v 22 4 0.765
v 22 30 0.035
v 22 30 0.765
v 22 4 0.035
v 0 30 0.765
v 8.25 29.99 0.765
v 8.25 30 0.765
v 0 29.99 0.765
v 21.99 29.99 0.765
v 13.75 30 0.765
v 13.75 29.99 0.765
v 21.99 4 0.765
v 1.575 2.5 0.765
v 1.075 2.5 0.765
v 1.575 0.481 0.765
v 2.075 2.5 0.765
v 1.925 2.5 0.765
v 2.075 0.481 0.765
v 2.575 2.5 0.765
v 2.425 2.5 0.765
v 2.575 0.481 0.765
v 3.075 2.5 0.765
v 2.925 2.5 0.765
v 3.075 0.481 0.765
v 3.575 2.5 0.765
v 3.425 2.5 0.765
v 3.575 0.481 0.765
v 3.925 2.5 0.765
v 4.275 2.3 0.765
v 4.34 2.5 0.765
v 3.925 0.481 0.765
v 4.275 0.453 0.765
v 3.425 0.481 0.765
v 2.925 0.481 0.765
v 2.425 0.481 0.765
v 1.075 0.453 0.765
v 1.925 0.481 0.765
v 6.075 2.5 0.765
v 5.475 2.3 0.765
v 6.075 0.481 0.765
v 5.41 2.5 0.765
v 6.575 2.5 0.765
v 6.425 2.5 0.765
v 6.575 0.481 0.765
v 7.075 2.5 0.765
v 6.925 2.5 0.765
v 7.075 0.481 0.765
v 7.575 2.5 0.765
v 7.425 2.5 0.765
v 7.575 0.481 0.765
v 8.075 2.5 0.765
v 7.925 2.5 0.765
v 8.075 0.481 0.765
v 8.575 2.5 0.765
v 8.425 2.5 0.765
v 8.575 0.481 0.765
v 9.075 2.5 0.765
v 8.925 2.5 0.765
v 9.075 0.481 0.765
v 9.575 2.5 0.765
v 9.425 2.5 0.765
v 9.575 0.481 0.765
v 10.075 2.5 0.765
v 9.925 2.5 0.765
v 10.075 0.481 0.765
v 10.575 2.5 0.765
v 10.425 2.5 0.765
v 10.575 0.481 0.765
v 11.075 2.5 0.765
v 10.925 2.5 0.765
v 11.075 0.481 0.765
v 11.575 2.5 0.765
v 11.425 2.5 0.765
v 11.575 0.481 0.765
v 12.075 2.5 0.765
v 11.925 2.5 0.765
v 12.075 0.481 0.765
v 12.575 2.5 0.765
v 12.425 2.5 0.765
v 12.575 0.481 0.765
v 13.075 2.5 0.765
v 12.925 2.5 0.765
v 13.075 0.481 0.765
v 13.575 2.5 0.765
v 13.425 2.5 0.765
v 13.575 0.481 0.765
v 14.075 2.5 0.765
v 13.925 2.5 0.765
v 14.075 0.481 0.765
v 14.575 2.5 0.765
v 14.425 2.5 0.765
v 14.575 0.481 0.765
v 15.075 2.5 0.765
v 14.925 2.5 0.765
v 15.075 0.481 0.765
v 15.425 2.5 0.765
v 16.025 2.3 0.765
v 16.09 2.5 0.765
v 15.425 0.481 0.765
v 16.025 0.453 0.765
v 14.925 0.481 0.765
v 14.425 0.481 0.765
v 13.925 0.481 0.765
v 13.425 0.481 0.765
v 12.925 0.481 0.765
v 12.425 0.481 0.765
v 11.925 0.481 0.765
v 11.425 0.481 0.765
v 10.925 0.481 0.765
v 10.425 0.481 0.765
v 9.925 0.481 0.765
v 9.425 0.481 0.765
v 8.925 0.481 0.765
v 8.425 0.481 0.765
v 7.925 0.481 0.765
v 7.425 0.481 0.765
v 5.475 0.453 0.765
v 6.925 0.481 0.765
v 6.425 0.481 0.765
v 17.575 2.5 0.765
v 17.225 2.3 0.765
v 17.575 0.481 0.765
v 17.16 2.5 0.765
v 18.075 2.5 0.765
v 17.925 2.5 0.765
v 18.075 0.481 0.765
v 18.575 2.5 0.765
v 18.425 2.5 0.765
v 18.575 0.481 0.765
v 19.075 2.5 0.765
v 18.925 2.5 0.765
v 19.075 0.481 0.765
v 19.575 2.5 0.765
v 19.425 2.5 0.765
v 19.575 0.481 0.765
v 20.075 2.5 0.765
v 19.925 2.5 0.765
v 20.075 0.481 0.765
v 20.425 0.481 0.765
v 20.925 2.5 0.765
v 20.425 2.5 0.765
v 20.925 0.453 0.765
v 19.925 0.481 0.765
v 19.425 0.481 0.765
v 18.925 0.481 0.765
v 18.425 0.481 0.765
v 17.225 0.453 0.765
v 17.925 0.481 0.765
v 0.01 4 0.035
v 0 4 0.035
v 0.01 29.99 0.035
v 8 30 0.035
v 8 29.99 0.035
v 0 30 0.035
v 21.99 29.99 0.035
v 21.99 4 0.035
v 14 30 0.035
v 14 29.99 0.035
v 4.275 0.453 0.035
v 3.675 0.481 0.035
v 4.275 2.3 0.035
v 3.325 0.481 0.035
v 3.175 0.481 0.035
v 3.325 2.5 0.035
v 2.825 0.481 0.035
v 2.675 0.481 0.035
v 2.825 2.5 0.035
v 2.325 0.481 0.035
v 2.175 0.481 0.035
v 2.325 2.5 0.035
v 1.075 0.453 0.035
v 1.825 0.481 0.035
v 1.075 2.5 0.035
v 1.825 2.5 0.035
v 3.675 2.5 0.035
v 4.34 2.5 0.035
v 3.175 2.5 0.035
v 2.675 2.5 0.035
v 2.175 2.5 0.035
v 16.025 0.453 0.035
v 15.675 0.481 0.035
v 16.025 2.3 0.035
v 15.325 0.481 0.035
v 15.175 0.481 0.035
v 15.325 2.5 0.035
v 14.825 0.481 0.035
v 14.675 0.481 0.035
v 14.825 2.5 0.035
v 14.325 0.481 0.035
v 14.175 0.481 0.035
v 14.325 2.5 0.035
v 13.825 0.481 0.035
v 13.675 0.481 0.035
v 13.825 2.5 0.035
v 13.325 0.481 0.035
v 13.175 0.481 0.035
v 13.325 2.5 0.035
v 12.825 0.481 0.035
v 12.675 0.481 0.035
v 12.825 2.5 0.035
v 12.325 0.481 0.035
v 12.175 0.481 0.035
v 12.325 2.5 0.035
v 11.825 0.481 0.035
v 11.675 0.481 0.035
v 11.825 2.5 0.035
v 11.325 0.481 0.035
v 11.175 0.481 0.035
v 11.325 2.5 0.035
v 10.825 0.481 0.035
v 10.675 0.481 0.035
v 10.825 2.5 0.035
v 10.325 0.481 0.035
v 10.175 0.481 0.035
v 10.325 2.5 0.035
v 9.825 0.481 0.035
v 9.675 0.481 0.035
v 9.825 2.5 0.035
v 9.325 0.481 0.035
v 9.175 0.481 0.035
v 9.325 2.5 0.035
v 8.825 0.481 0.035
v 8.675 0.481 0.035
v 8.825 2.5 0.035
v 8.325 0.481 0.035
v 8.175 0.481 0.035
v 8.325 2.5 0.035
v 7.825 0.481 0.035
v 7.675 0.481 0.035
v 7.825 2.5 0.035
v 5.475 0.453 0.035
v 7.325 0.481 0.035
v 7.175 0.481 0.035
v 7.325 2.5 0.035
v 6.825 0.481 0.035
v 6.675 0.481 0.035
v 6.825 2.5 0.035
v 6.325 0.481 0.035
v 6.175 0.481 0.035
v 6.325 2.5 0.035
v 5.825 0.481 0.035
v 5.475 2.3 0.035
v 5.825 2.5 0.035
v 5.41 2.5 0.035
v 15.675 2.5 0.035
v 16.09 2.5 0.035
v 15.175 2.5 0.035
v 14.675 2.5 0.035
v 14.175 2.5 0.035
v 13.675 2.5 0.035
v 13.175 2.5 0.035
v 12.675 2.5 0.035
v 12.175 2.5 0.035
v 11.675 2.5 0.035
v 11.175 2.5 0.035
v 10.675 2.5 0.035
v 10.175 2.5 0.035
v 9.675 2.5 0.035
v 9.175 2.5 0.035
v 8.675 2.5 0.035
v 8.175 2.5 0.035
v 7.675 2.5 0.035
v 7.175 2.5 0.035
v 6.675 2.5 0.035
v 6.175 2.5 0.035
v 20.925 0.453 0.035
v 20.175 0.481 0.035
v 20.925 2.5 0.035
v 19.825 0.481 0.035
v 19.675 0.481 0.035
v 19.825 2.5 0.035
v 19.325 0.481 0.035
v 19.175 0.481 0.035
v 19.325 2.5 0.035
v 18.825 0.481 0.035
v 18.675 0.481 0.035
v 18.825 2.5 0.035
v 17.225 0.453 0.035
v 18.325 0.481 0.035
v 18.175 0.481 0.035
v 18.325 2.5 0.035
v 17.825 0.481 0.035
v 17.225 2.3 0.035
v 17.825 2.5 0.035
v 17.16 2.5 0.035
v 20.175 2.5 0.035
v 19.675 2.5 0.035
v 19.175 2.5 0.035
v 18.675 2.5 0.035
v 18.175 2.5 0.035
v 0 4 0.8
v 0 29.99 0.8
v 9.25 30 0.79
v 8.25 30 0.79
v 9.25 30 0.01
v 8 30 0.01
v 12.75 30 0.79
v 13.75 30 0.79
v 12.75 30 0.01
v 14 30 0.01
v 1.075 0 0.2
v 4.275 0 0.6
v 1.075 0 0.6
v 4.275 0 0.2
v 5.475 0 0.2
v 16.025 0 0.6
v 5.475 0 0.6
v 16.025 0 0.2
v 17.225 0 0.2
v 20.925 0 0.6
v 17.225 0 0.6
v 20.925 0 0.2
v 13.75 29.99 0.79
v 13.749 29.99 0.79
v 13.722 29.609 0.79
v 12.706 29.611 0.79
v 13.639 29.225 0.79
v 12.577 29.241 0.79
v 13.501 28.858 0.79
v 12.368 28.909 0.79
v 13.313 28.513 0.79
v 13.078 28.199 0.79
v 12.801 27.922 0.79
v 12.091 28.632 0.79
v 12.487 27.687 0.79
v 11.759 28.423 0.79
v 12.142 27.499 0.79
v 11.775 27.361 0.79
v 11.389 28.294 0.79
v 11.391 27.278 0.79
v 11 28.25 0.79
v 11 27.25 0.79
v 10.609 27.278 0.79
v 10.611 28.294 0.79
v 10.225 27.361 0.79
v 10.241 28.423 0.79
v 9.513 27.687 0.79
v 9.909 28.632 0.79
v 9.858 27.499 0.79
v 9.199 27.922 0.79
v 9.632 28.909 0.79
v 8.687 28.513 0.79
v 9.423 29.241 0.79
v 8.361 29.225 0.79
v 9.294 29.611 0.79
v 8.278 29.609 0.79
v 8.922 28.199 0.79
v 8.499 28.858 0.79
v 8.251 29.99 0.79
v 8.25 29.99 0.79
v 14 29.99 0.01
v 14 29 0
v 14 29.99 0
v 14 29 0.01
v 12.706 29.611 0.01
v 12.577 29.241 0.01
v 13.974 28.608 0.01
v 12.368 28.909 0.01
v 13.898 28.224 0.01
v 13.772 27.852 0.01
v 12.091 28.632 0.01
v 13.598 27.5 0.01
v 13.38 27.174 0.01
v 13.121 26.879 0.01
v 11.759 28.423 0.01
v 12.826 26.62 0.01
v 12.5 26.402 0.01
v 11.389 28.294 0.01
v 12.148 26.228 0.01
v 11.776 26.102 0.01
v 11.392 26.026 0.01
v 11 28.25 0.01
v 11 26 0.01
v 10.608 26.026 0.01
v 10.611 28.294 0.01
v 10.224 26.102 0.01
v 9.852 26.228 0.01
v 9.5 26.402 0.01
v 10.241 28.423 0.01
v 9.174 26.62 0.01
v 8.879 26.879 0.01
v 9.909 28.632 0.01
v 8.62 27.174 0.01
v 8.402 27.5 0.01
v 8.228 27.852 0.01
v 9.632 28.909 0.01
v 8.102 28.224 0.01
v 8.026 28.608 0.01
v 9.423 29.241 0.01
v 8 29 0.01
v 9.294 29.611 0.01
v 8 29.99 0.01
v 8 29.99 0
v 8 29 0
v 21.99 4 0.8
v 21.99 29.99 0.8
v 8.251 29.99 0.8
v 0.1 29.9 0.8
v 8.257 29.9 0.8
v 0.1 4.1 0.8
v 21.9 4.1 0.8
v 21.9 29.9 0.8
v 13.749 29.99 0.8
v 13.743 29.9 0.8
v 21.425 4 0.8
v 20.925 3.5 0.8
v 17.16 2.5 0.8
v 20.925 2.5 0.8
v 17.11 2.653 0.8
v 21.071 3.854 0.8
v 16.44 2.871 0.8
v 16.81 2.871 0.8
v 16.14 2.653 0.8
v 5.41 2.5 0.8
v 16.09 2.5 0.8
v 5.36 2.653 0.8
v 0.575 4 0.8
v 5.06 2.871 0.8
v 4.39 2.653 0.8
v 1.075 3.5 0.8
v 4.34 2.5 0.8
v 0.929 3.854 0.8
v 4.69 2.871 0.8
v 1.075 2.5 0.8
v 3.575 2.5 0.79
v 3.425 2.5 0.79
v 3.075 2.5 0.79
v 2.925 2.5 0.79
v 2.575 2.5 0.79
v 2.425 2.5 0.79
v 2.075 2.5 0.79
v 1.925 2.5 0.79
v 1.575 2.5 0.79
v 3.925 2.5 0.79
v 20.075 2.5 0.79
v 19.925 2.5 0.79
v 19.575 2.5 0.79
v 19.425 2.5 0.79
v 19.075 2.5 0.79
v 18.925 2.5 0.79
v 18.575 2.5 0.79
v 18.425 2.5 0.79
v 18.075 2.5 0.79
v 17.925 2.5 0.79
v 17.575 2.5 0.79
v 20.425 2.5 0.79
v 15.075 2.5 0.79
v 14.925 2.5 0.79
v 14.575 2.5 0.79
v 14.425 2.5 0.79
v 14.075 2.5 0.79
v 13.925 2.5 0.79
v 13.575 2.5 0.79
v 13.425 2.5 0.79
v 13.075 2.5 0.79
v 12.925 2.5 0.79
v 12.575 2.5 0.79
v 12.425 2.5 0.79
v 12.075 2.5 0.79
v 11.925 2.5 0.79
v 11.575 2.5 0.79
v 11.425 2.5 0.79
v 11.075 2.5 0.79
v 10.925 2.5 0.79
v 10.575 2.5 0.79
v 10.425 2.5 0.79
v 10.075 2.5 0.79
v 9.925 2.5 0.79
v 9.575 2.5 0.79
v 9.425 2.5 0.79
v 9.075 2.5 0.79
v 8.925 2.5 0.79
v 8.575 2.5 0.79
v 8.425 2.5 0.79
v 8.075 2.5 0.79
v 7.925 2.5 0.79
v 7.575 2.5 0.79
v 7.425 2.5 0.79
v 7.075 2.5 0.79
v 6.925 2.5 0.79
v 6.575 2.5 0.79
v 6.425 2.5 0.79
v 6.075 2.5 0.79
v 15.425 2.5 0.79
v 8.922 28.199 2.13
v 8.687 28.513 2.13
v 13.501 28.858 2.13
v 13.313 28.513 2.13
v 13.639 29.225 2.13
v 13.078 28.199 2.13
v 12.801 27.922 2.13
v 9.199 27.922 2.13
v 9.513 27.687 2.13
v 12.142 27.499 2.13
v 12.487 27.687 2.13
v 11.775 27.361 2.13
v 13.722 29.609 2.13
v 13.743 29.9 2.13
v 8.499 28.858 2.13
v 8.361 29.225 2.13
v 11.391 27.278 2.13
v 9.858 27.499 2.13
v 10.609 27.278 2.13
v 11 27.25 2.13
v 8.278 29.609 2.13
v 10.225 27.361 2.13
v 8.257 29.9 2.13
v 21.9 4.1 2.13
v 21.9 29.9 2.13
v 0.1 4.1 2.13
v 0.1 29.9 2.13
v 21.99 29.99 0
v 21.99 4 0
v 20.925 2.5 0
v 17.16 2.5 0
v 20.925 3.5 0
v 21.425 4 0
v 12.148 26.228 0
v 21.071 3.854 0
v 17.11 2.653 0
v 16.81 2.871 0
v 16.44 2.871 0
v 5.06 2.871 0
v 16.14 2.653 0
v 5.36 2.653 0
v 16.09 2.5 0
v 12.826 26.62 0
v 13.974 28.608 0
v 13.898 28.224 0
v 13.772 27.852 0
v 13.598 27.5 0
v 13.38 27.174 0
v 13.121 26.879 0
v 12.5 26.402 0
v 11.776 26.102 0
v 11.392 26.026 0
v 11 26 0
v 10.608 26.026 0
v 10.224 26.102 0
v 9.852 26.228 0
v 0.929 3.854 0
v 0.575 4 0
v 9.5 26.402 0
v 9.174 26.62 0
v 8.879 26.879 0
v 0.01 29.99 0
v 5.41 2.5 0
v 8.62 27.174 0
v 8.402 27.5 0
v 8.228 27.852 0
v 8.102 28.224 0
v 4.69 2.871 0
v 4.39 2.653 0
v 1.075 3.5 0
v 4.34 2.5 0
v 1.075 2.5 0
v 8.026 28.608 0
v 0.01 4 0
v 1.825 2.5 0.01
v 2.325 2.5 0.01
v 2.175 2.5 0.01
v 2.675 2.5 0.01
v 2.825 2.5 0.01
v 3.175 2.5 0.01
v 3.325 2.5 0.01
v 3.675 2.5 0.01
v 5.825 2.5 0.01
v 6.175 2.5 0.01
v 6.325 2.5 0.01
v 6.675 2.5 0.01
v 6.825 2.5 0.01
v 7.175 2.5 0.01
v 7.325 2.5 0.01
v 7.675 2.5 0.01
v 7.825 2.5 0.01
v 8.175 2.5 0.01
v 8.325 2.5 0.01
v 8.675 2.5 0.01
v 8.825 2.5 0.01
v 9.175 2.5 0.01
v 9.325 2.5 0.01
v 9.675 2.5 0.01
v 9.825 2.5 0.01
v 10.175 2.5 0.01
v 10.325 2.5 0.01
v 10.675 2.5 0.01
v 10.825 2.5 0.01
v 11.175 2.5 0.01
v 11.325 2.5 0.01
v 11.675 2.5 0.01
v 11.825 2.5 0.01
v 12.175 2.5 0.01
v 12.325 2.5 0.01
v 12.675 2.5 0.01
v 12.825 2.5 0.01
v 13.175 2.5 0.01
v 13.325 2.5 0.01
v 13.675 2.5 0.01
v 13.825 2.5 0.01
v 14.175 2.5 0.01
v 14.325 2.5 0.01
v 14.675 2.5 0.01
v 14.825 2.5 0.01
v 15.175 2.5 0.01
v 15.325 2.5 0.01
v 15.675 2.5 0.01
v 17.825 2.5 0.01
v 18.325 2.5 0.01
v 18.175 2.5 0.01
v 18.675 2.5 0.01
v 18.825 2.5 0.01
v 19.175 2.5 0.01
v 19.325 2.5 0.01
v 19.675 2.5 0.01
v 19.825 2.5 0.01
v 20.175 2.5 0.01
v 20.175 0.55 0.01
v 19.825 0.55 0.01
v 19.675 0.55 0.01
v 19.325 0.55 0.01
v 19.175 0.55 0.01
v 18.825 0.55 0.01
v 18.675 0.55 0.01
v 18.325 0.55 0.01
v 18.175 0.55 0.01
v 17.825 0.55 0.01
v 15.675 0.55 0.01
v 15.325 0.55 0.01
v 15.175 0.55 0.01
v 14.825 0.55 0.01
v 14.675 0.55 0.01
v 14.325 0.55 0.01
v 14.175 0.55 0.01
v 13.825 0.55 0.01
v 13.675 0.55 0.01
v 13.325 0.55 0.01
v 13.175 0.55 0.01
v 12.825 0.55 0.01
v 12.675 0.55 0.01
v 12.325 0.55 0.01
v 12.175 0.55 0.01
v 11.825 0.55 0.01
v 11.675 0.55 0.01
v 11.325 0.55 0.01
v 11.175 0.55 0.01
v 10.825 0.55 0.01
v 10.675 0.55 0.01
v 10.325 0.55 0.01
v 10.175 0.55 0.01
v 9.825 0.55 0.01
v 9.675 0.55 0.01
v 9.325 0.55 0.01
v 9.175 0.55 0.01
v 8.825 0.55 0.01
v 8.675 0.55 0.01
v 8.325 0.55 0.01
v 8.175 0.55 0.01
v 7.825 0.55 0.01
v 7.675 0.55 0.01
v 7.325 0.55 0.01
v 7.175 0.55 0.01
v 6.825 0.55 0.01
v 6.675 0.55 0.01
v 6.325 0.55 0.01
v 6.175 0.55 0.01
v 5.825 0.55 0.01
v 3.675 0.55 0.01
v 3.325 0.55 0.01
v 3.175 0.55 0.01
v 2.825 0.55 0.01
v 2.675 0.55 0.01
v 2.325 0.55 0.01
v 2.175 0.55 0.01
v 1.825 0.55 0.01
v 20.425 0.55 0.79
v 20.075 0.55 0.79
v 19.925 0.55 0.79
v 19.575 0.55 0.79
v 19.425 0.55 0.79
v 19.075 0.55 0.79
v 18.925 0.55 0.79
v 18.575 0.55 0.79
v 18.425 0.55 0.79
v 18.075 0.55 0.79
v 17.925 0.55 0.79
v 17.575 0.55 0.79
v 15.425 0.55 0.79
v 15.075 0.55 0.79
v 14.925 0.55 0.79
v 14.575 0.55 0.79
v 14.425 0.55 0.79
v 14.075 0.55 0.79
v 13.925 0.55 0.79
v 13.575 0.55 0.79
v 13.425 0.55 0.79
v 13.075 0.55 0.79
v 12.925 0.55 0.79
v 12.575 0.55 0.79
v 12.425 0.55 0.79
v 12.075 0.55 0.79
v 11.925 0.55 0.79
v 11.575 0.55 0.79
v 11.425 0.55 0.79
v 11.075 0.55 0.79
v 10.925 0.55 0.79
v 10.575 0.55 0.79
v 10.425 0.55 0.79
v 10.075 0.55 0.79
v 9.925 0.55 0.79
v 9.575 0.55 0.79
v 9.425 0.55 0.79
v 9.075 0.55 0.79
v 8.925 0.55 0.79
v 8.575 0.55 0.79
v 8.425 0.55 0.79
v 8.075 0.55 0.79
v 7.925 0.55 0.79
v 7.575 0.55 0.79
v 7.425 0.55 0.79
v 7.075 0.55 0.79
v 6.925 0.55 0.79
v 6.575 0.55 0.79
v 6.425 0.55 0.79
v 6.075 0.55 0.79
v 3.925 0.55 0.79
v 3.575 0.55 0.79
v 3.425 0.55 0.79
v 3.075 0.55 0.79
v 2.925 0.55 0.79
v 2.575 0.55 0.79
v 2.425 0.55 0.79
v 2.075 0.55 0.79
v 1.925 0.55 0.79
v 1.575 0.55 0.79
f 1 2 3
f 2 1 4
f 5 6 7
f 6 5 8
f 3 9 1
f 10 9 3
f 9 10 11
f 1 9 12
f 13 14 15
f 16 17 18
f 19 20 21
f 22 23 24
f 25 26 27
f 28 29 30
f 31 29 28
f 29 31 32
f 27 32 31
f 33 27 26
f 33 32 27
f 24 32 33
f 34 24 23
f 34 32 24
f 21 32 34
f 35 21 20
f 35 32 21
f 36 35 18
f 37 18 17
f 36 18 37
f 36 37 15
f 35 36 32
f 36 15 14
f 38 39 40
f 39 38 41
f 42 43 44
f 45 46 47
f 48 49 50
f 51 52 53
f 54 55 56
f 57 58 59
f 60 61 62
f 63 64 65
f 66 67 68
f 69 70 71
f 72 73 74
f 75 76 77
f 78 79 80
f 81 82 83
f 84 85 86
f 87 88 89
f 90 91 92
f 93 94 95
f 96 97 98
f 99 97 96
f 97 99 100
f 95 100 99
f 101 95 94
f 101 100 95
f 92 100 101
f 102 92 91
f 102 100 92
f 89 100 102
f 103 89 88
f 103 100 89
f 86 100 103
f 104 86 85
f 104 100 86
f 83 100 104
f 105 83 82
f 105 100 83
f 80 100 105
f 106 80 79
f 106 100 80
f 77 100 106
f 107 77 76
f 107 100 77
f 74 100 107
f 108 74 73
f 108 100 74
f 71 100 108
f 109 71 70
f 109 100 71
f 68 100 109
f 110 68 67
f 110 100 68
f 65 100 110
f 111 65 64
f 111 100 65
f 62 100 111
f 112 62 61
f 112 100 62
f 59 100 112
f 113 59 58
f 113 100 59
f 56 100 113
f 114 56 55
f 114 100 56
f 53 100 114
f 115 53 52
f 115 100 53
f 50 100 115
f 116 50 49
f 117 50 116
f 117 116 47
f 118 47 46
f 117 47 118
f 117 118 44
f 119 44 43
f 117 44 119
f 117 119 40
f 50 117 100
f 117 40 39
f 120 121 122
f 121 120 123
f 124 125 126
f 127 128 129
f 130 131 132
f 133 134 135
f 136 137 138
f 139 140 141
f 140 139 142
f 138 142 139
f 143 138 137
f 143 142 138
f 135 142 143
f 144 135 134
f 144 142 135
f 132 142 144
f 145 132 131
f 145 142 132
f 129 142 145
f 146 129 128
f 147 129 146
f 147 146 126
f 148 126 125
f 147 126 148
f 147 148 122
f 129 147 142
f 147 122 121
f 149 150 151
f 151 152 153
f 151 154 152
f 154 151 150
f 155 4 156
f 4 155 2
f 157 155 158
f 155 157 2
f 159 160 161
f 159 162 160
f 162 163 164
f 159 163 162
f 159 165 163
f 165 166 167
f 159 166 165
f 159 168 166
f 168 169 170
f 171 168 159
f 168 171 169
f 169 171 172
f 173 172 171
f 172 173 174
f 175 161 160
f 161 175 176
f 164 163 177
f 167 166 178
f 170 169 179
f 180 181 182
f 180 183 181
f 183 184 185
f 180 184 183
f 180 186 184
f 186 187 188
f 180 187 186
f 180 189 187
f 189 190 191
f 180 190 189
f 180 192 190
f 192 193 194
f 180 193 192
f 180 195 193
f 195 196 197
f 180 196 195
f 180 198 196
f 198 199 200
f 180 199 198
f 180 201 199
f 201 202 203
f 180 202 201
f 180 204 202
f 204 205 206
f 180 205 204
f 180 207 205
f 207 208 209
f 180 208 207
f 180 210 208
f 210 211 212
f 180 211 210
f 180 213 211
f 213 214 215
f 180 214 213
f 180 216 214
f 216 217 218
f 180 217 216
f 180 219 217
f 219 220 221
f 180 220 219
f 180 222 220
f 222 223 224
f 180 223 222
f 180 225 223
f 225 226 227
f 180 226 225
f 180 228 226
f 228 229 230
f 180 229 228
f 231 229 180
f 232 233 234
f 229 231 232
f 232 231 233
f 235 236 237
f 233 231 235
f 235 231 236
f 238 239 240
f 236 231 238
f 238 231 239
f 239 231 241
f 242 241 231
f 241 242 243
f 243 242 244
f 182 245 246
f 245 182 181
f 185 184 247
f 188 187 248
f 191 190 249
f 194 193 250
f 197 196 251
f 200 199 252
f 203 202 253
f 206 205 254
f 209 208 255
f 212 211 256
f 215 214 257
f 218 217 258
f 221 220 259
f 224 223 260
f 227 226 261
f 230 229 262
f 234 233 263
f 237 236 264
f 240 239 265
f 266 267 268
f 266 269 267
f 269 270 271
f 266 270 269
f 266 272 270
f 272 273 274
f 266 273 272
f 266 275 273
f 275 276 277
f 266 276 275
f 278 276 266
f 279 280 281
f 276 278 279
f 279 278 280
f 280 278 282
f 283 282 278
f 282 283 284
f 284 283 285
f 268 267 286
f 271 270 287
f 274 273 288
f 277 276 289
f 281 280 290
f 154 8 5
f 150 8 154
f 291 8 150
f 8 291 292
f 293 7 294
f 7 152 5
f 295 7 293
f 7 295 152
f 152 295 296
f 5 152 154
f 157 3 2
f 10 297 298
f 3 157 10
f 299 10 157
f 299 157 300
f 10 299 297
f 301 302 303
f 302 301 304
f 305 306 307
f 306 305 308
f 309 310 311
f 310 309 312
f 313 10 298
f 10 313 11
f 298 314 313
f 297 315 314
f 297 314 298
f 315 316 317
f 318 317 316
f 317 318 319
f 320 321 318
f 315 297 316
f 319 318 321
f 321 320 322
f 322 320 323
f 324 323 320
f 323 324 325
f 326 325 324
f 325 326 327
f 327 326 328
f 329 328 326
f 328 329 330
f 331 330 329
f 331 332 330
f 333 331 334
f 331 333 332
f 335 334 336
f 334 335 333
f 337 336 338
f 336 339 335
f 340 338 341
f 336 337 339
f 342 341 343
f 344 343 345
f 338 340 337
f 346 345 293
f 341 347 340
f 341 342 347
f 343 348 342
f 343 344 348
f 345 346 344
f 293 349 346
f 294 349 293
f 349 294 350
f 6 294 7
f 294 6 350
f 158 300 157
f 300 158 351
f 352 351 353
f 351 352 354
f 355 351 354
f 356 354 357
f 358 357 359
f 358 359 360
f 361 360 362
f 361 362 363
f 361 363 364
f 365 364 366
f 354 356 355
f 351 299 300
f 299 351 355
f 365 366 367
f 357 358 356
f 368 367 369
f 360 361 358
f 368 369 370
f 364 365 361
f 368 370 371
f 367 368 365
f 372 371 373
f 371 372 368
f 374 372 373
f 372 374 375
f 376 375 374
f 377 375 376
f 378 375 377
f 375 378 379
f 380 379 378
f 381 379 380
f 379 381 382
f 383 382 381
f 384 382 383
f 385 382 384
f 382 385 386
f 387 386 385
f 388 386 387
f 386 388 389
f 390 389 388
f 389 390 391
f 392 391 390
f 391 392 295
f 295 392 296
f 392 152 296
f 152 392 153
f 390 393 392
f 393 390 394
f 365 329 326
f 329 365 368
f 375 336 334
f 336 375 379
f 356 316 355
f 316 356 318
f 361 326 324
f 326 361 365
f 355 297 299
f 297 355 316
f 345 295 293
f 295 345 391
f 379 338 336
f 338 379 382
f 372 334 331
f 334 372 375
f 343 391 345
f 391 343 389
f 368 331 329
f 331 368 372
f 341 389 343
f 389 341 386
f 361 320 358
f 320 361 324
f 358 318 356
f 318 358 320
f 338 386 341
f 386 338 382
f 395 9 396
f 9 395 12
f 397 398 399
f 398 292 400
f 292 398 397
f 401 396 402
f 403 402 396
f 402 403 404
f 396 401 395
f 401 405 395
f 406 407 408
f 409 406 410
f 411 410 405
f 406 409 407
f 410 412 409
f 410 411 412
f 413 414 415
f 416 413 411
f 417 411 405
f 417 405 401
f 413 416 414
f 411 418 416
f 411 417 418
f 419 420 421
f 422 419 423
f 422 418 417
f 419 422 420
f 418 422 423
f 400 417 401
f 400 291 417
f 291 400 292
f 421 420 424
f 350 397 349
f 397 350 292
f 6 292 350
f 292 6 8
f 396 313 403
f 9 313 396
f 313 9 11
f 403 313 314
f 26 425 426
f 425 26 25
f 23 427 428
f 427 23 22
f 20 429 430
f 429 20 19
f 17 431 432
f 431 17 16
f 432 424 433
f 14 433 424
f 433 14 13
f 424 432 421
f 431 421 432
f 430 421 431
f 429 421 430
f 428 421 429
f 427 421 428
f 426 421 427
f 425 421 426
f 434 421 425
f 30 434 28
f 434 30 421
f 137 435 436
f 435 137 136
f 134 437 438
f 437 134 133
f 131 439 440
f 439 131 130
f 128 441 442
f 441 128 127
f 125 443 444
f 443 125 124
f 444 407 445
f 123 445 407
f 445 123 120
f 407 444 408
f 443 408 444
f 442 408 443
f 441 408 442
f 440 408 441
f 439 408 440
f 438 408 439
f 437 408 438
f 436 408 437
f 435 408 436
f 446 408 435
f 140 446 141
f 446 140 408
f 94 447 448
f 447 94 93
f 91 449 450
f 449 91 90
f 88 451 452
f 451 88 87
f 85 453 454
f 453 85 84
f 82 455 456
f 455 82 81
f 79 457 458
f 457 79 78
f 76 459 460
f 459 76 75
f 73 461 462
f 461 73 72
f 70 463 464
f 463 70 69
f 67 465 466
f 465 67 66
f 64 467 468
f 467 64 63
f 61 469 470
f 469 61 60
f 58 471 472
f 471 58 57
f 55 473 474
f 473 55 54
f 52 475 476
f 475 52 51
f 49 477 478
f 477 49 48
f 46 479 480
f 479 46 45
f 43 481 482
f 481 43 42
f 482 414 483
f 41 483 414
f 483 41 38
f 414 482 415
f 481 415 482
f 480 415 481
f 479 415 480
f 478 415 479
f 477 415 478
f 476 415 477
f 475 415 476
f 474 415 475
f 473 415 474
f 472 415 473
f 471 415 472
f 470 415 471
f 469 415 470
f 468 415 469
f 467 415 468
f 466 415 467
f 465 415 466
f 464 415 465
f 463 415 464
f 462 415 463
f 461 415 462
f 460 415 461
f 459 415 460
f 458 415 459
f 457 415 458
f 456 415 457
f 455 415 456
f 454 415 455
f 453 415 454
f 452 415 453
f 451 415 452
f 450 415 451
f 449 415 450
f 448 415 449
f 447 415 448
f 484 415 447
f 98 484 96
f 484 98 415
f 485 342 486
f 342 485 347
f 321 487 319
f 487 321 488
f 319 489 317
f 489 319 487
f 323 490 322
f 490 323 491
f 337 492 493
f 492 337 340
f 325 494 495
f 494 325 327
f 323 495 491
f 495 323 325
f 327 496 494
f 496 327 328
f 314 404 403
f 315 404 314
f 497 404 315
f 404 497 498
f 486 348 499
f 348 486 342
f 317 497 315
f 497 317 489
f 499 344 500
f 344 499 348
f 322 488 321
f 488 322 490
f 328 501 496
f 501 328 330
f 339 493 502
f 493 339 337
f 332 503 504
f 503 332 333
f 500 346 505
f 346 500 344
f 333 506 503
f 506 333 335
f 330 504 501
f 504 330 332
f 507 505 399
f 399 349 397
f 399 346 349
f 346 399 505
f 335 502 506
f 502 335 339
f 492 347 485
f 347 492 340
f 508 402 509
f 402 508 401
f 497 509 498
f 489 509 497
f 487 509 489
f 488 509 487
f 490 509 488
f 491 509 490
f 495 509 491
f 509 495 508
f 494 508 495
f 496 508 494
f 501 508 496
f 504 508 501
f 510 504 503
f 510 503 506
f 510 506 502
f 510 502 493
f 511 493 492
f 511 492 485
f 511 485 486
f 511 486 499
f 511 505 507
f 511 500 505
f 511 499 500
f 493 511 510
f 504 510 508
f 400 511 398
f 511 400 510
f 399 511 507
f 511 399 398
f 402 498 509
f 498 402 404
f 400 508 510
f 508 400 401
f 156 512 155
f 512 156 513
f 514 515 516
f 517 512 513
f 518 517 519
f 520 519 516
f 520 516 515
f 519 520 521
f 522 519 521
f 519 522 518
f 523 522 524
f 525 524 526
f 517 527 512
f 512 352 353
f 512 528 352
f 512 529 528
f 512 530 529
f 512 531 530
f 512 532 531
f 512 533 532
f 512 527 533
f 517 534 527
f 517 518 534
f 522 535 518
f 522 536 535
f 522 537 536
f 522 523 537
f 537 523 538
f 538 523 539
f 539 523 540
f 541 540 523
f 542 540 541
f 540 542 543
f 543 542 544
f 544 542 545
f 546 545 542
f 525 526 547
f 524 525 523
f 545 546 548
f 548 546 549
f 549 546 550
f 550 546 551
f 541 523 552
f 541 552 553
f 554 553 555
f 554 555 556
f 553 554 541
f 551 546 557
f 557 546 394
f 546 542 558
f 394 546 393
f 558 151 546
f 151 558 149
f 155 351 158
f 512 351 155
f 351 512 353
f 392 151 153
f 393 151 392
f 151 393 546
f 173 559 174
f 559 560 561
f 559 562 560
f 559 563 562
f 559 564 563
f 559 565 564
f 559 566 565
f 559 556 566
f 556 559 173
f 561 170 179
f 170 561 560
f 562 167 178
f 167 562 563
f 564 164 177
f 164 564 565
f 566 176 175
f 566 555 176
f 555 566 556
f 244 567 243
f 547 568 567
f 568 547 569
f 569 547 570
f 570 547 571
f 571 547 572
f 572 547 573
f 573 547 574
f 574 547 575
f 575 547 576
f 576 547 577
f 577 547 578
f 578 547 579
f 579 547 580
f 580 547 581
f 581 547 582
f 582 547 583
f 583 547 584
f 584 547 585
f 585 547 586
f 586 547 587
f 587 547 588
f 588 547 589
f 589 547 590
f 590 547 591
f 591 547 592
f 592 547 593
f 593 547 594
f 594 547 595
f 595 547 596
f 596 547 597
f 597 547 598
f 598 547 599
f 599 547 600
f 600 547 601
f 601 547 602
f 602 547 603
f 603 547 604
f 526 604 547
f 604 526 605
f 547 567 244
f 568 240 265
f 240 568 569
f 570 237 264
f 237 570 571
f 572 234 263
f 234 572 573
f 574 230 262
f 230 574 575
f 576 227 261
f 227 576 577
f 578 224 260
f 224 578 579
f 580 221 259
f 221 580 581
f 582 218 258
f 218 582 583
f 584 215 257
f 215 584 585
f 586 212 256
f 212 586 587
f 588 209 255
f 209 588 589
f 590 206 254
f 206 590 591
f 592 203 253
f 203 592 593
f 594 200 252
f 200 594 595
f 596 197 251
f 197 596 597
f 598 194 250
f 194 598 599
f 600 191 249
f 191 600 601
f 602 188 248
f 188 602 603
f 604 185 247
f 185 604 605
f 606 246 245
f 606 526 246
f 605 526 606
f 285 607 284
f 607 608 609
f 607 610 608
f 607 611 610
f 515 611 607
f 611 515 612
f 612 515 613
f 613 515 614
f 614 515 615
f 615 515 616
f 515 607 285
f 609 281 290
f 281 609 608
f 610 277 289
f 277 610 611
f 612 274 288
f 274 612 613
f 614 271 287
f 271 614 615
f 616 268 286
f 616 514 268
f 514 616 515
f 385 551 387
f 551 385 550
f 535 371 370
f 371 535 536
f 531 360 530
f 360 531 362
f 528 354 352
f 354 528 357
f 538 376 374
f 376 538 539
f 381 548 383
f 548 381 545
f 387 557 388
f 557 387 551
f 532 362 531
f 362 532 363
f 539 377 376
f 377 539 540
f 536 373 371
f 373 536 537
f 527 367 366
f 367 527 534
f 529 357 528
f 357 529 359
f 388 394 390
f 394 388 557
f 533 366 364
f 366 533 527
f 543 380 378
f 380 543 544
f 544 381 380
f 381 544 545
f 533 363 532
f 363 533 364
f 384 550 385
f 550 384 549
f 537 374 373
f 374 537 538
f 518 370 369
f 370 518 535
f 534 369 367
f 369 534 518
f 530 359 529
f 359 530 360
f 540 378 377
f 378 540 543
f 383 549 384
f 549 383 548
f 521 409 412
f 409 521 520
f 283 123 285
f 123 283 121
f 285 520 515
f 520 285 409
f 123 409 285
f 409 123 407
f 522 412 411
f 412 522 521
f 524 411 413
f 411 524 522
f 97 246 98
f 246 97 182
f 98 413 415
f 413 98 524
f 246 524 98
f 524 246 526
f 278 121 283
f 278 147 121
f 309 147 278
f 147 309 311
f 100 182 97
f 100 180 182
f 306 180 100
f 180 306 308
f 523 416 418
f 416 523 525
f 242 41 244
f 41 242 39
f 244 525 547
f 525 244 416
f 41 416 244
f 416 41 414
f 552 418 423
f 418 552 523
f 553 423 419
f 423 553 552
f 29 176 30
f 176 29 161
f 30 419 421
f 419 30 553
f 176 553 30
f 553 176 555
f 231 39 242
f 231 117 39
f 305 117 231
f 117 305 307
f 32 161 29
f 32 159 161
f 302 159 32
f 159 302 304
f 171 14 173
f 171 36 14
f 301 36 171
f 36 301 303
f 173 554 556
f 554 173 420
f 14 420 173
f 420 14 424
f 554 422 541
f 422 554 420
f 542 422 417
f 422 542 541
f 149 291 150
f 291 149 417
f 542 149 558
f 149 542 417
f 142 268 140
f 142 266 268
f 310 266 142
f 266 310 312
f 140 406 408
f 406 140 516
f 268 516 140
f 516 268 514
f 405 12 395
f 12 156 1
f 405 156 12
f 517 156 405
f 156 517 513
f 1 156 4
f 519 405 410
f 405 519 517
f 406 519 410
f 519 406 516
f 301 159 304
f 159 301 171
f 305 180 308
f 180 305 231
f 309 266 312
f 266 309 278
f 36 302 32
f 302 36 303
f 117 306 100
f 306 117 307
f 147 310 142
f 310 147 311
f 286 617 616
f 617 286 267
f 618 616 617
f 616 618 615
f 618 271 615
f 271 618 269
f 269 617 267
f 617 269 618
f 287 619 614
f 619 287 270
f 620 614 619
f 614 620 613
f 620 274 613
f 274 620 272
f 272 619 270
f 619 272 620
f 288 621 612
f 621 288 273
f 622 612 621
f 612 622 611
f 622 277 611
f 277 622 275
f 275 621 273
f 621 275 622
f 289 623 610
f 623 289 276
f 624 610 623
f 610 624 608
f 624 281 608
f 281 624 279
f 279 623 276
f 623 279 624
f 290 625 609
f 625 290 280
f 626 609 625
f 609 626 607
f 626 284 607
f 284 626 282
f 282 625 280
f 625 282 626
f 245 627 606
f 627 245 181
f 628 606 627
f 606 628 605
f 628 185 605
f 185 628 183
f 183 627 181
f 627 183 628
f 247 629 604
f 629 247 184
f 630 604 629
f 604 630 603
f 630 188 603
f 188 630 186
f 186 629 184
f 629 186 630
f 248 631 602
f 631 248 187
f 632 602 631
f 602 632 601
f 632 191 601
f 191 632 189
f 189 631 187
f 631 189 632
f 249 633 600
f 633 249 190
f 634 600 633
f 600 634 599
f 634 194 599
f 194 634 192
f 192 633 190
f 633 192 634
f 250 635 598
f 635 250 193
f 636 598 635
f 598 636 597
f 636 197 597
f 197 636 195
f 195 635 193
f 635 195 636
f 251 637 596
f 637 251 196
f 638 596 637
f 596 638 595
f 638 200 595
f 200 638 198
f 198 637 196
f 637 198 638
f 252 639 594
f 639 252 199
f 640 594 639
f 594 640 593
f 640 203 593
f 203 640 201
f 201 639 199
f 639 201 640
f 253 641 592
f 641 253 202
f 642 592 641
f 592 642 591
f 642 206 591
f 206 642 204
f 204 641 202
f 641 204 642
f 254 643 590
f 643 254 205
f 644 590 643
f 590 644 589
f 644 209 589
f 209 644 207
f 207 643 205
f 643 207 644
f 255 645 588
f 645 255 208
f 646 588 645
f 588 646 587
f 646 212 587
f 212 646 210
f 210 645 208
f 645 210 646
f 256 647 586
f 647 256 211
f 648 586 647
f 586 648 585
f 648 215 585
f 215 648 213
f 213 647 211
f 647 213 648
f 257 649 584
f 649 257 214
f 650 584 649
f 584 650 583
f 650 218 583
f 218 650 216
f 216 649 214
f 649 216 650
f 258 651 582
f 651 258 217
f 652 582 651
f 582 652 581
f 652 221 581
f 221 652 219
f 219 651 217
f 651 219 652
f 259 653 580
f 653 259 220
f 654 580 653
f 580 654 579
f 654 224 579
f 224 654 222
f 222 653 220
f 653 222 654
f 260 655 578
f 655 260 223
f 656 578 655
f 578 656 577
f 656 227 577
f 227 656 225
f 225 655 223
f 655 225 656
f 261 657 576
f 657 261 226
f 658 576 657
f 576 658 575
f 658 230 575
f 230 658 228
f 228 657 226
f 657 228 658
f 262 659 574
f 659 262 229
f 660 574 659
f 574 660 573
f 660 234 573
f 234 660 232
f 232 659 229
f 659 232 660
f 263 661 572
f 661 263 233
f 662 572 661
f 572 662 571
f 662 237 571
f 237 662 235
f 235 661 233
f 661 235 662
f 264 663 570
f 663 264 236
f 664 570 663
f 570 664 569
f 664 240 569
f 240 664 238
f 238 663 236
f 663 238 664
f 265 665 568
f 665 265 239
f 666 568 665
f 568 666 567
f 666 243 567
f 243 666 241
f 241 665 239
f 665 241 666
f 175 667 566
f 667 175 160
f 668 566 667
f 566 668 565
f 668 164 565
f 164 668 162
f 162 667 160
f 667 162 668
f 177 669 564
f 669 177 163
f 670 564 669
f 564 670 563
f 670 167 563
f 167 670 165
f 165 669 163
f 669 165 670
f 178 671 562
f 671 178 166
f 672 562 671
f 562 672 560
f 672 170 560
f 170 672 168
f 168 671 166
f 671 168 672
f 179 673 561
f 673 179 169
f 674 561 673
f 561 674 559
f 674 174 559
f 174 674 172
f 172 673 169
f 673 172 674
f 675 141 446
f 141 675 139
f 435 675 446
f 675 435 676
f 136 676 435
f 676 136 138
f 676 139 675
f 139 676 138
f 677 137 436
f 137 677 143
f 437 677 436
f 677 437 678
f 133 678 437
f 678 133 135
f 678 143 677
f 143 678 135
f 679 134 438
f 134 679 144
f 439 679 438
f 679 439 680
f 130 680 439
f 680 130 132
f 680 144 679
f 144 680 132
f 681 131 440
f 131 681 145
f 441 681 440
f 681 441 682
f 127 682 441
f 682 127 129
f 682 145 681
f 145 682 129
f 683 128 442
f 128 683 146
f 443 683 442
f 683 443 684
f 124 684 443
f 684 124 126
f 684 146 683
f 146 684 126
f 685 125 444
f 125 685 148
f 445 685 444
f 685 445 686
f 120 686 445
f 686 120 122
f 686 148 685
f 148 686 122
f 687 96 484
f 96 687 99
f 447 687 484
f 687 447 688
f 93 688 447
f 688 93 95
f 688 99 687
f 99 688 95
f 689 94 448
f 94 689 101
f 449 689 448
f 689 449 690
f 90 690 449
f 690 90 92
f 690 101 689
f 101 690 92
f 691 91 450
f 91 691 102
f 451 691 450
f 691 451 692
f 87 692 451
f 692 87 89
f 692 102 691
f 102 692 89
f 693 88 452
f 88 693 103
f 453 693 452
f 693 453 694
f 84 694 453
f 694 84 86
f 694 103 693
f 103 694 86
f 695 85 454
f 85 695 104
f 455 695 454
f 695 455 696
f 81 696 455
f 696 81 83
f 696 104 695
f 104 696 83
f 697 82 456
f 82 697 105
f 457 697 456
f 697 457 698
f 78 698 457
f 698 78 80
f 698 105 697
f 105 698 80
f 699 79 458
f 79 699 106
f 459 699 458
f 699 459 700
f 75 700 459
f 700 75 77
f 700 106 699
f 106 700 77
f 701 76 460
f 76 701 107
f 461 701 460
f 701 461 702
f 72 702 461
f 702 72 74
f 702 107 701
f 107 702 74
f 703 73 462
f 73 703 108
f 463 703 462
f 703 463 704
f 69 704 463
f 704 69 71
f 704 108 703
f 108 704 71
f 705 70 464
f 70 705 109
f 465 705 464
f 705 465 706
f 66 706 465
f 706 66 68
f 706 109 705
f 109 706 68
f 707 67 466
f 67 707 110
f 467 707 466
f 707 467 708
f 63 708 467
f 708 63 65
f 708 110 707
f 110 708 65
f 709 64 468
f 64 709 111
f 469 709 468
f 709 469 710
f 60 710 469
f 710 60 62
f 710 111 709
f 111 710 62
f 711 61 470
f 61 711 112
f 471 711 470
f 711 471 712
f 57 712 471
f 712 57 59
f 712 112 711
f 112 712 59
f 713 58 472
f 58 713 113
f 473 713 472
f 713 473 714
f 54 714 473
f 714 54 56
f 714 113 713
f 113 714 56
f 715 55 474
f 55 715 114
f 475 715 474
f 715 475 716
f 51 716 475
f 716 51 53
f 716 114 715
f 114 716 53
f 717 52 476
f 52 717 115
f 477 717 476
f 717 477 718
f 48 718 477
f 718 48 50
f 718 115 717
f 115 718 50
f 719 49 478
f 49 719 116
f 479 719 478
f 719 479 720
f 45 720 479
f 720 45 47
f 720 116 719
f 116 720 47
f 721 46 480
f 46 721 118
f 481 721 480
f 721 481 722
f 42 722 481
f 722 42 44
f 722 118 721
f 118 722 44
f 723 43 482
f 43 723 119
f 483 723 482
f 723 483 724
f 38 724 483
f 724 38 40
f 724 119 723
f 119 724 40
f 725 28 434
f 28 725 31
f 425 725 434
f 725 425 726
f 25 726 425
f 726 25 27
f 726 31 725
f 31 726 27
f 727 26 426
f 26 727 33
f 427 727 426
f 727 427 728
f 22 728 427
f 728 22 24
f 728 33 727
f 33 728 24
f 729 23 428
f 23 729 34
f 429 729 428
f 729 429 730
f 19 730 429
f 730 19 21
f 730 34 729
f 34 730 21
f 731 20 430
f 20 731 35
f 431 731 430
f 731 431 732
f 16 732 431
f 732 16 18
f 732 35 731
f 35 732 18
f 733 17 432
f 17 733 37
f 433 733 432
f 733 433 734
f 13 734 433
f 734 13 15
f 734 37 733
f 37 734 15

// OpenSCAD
$fa=1;
$fs=0.4;

eps = 0.01;



module chamfer_edge(length, depth, chamfer_angle) {
    translate([0, 0, -eps])
    linear_extrude(length + 2 * eps)
    polygon([
        [-eps, -eps],
        [(depth + eps) / tan(chamfer_angle), -eps],
        [-eps, depth + eps * tan(chamfer_angle)],
    ]);
}


module card(
    width=22,
    length=30,
    thickness=0.8,
    chamfer_depth=0.2,
    chamfer_angle=20,
    plating=0.035,
//    keys="bm", // must be sorted
    keys="bm",
    component_height=1.35,
) {
    
        all_keys = "abcdefghjklm";
        key_offsets = [
            6.625,
            5.625,
            4.625,
            3.625,
            2.625,
            1.625,
            -1.125,
            -2.125,
            -3.125,
            -4.125,
            -5.125,
            -6.125,
        ];

        connector_width = 19.85;
        connector_center = width/2;
    
        module bottom_chamfer(width=width, color="beige") {
            difference() {
                children(0);
                color(color) rotate([-90,180,-90]) scale([1,1,1]) chamfer_edge(width, chamfer_depth, chamfer_angle);
            };
        }
        
        module top_chamfer(width=width, color="beige") {
            difference() {
                children(0);
                color(color) translate([0, 0, thickness]) rotate([-90,0,90]) scale([1,1,-1]) chamfer_edge(width, chamfer_depth, chamfer_angle);
            };
        }
    
        module connector_milling() {
            module connector_side_milling() {
                translate([0,0,-eps])
                linear_extrude(thickness + 2*eps)
                union() {
                    // left
                    polygon([
                        [-eps, -eps],
                        [connector_center - connector_width/2, -eps],
                        [connector_center - connector_width/2, 3.5],
                        [connector_center - connector_width/2 - 0.5, 4],
                        [-eps, 4],
                    ]);
                    translate([connector_center - connector_width/2 - 0.5, 3.5]) circle(r=0.5);
                    
                    // right
                    polygon([
                        [width+eps, -eps],
                        [connector_center + connector_width/2, -eps],
                        [connector_center + connector_width/2, 3.5],
                        [connector_center + connector_width/2 + 0.5, 4],
                        [width+eps, 4],
                    ]);
                    translate([connector_center + connector_width/2 + 0.5, 3.5]) circle(r=0.5);

                };
            }
            
            module mill_key(x) {
                translate([x, 2.3, -eps]) cylinder(r=0.6, h=thickness+2*eps);
                translate([x-0.6, -eps, -eps]) cube([1.2, 2.3+eps, thickness+2*eps]);
            }
            
            difference() {
                children();
                
                color("beige") {
                    connector_side_milling(); // left side
                                    
                    for(keynum = search(keys, all_keys)) {
                        mill_key(connector_center+key_offsets[keynum]);
                    }
                }
            };
        }


        // FR4        
        top_chamfer()
        bottom_chamfer()
        connector_milling() {
            // mounting hole

            difference() {
                union() {
                    color("beige") translate([0,0,plating]) cube([width, length, thickness - 2*plating]);
                    color("gold") translate([connector_center - 2.75, length - 2.75, thickness-plating]) cube([5.5, 2.75, plating - eps]);
                    color("gold") translate([connector_center - 3, length - 4, eps]) cube([6, 4, plating-eps]);
                };
                translate([connector_center, length, -eps]) cylinder(r=1.75, h=thickness+2*eps);
            };
            
            // solder mask top
            color("green")
            difference() {
                translate([0, 2.5, thickness - plating - eps]) cube([width - eps, length - 2.5 - eps, plating+eps]);
                
                translate([connector_center, length, thickness-plating- 2*eps]) cylinder(r=2.75, h=plating+4*eps);
            }
            
            // top components
            color("#444444")
            difference() {
                translate([0.1, 4.1, thickness-2*eps]) cube([width-0.2, length-4.2, component_height]);
                translate([connector_center, length, thickness-3*eps]) cylinder(r=2.75, h=component_height+6*eps);
            }
            
            
            // solder mask bottom
            color("green")
            difference() {
                translate([eps, 2.5, 0])
                cube([width - 2 * eps, length - 2.5 - eps, plating + eps]);
                    
                translate([connector_center - 3, length - 1, -eps])
                cube([6, 1, plating+4*eps]);
    
                translate([connector_center, length - 1, -eps])
                cylinder(r=3, h=plating+4*eps);
            };
        };
        
        
        module pin_bottom() {
            translate([-0.175,0,eps]) bottom_chamfer(0.35, color="gold") cube([0.35, 2.5, plating + eps]);
        }
        
        module pin_top() {
            translate([-0.175,0,-eps]) top_chamfer(0.35, color="gold") translate([0,0,thickness - plating]) cube([0.35, 2.5, plating]);
        }

        
        module pins(first_start, bdwys, final_end) {
            ends = [for (bdwy = bdwys) first_start - bdwy];
            starts = [for (end = ends) end - 2.5];

            keynums = search(keys, all_keys);
            first_end = (len(keynums) > 0) ? ends[keynums[0]] : final_end;
            
            color("gold") {
                for(dx = [first_start:-0.5:first_end]) translate([connector_center + dx, 0, 0]) children();
            }
            
            if (len(keys) > 0) {
                second_start = starts[keynums[0]];
                second_end = (len(keynums) > 1)? ends[keynums[1]] : final_end;
                
                color("gold") {
                    for(dx = [second_start:-0.5:second_end]) translate([connector_center + dx, 0, 0]) children();
                }
            }
            
            if (len(keys) > 1) {
                third_start = starts[keynums[1]];
                third_end = final_end;
                
                color("gold") {
                    for(dx = [third_start:-0.5:third_end]) translate([connector_center + dx, 0, 0]) children();
                };
            }
        }

        // bottom pins
        pins(
            9,
            concat([for (i = [1:1:6]) i], [for (i = [9:1:14]) i]),
            -9
        ) pin_bottom();
       
        // top pins
        pins(
            9.25,
            concat([for (i = [1.5:1:6.5]) i], [for (i = [9:1:14]) i]),
            -9.25 // one extra pin on top
        ) pin_top();

}

card();
